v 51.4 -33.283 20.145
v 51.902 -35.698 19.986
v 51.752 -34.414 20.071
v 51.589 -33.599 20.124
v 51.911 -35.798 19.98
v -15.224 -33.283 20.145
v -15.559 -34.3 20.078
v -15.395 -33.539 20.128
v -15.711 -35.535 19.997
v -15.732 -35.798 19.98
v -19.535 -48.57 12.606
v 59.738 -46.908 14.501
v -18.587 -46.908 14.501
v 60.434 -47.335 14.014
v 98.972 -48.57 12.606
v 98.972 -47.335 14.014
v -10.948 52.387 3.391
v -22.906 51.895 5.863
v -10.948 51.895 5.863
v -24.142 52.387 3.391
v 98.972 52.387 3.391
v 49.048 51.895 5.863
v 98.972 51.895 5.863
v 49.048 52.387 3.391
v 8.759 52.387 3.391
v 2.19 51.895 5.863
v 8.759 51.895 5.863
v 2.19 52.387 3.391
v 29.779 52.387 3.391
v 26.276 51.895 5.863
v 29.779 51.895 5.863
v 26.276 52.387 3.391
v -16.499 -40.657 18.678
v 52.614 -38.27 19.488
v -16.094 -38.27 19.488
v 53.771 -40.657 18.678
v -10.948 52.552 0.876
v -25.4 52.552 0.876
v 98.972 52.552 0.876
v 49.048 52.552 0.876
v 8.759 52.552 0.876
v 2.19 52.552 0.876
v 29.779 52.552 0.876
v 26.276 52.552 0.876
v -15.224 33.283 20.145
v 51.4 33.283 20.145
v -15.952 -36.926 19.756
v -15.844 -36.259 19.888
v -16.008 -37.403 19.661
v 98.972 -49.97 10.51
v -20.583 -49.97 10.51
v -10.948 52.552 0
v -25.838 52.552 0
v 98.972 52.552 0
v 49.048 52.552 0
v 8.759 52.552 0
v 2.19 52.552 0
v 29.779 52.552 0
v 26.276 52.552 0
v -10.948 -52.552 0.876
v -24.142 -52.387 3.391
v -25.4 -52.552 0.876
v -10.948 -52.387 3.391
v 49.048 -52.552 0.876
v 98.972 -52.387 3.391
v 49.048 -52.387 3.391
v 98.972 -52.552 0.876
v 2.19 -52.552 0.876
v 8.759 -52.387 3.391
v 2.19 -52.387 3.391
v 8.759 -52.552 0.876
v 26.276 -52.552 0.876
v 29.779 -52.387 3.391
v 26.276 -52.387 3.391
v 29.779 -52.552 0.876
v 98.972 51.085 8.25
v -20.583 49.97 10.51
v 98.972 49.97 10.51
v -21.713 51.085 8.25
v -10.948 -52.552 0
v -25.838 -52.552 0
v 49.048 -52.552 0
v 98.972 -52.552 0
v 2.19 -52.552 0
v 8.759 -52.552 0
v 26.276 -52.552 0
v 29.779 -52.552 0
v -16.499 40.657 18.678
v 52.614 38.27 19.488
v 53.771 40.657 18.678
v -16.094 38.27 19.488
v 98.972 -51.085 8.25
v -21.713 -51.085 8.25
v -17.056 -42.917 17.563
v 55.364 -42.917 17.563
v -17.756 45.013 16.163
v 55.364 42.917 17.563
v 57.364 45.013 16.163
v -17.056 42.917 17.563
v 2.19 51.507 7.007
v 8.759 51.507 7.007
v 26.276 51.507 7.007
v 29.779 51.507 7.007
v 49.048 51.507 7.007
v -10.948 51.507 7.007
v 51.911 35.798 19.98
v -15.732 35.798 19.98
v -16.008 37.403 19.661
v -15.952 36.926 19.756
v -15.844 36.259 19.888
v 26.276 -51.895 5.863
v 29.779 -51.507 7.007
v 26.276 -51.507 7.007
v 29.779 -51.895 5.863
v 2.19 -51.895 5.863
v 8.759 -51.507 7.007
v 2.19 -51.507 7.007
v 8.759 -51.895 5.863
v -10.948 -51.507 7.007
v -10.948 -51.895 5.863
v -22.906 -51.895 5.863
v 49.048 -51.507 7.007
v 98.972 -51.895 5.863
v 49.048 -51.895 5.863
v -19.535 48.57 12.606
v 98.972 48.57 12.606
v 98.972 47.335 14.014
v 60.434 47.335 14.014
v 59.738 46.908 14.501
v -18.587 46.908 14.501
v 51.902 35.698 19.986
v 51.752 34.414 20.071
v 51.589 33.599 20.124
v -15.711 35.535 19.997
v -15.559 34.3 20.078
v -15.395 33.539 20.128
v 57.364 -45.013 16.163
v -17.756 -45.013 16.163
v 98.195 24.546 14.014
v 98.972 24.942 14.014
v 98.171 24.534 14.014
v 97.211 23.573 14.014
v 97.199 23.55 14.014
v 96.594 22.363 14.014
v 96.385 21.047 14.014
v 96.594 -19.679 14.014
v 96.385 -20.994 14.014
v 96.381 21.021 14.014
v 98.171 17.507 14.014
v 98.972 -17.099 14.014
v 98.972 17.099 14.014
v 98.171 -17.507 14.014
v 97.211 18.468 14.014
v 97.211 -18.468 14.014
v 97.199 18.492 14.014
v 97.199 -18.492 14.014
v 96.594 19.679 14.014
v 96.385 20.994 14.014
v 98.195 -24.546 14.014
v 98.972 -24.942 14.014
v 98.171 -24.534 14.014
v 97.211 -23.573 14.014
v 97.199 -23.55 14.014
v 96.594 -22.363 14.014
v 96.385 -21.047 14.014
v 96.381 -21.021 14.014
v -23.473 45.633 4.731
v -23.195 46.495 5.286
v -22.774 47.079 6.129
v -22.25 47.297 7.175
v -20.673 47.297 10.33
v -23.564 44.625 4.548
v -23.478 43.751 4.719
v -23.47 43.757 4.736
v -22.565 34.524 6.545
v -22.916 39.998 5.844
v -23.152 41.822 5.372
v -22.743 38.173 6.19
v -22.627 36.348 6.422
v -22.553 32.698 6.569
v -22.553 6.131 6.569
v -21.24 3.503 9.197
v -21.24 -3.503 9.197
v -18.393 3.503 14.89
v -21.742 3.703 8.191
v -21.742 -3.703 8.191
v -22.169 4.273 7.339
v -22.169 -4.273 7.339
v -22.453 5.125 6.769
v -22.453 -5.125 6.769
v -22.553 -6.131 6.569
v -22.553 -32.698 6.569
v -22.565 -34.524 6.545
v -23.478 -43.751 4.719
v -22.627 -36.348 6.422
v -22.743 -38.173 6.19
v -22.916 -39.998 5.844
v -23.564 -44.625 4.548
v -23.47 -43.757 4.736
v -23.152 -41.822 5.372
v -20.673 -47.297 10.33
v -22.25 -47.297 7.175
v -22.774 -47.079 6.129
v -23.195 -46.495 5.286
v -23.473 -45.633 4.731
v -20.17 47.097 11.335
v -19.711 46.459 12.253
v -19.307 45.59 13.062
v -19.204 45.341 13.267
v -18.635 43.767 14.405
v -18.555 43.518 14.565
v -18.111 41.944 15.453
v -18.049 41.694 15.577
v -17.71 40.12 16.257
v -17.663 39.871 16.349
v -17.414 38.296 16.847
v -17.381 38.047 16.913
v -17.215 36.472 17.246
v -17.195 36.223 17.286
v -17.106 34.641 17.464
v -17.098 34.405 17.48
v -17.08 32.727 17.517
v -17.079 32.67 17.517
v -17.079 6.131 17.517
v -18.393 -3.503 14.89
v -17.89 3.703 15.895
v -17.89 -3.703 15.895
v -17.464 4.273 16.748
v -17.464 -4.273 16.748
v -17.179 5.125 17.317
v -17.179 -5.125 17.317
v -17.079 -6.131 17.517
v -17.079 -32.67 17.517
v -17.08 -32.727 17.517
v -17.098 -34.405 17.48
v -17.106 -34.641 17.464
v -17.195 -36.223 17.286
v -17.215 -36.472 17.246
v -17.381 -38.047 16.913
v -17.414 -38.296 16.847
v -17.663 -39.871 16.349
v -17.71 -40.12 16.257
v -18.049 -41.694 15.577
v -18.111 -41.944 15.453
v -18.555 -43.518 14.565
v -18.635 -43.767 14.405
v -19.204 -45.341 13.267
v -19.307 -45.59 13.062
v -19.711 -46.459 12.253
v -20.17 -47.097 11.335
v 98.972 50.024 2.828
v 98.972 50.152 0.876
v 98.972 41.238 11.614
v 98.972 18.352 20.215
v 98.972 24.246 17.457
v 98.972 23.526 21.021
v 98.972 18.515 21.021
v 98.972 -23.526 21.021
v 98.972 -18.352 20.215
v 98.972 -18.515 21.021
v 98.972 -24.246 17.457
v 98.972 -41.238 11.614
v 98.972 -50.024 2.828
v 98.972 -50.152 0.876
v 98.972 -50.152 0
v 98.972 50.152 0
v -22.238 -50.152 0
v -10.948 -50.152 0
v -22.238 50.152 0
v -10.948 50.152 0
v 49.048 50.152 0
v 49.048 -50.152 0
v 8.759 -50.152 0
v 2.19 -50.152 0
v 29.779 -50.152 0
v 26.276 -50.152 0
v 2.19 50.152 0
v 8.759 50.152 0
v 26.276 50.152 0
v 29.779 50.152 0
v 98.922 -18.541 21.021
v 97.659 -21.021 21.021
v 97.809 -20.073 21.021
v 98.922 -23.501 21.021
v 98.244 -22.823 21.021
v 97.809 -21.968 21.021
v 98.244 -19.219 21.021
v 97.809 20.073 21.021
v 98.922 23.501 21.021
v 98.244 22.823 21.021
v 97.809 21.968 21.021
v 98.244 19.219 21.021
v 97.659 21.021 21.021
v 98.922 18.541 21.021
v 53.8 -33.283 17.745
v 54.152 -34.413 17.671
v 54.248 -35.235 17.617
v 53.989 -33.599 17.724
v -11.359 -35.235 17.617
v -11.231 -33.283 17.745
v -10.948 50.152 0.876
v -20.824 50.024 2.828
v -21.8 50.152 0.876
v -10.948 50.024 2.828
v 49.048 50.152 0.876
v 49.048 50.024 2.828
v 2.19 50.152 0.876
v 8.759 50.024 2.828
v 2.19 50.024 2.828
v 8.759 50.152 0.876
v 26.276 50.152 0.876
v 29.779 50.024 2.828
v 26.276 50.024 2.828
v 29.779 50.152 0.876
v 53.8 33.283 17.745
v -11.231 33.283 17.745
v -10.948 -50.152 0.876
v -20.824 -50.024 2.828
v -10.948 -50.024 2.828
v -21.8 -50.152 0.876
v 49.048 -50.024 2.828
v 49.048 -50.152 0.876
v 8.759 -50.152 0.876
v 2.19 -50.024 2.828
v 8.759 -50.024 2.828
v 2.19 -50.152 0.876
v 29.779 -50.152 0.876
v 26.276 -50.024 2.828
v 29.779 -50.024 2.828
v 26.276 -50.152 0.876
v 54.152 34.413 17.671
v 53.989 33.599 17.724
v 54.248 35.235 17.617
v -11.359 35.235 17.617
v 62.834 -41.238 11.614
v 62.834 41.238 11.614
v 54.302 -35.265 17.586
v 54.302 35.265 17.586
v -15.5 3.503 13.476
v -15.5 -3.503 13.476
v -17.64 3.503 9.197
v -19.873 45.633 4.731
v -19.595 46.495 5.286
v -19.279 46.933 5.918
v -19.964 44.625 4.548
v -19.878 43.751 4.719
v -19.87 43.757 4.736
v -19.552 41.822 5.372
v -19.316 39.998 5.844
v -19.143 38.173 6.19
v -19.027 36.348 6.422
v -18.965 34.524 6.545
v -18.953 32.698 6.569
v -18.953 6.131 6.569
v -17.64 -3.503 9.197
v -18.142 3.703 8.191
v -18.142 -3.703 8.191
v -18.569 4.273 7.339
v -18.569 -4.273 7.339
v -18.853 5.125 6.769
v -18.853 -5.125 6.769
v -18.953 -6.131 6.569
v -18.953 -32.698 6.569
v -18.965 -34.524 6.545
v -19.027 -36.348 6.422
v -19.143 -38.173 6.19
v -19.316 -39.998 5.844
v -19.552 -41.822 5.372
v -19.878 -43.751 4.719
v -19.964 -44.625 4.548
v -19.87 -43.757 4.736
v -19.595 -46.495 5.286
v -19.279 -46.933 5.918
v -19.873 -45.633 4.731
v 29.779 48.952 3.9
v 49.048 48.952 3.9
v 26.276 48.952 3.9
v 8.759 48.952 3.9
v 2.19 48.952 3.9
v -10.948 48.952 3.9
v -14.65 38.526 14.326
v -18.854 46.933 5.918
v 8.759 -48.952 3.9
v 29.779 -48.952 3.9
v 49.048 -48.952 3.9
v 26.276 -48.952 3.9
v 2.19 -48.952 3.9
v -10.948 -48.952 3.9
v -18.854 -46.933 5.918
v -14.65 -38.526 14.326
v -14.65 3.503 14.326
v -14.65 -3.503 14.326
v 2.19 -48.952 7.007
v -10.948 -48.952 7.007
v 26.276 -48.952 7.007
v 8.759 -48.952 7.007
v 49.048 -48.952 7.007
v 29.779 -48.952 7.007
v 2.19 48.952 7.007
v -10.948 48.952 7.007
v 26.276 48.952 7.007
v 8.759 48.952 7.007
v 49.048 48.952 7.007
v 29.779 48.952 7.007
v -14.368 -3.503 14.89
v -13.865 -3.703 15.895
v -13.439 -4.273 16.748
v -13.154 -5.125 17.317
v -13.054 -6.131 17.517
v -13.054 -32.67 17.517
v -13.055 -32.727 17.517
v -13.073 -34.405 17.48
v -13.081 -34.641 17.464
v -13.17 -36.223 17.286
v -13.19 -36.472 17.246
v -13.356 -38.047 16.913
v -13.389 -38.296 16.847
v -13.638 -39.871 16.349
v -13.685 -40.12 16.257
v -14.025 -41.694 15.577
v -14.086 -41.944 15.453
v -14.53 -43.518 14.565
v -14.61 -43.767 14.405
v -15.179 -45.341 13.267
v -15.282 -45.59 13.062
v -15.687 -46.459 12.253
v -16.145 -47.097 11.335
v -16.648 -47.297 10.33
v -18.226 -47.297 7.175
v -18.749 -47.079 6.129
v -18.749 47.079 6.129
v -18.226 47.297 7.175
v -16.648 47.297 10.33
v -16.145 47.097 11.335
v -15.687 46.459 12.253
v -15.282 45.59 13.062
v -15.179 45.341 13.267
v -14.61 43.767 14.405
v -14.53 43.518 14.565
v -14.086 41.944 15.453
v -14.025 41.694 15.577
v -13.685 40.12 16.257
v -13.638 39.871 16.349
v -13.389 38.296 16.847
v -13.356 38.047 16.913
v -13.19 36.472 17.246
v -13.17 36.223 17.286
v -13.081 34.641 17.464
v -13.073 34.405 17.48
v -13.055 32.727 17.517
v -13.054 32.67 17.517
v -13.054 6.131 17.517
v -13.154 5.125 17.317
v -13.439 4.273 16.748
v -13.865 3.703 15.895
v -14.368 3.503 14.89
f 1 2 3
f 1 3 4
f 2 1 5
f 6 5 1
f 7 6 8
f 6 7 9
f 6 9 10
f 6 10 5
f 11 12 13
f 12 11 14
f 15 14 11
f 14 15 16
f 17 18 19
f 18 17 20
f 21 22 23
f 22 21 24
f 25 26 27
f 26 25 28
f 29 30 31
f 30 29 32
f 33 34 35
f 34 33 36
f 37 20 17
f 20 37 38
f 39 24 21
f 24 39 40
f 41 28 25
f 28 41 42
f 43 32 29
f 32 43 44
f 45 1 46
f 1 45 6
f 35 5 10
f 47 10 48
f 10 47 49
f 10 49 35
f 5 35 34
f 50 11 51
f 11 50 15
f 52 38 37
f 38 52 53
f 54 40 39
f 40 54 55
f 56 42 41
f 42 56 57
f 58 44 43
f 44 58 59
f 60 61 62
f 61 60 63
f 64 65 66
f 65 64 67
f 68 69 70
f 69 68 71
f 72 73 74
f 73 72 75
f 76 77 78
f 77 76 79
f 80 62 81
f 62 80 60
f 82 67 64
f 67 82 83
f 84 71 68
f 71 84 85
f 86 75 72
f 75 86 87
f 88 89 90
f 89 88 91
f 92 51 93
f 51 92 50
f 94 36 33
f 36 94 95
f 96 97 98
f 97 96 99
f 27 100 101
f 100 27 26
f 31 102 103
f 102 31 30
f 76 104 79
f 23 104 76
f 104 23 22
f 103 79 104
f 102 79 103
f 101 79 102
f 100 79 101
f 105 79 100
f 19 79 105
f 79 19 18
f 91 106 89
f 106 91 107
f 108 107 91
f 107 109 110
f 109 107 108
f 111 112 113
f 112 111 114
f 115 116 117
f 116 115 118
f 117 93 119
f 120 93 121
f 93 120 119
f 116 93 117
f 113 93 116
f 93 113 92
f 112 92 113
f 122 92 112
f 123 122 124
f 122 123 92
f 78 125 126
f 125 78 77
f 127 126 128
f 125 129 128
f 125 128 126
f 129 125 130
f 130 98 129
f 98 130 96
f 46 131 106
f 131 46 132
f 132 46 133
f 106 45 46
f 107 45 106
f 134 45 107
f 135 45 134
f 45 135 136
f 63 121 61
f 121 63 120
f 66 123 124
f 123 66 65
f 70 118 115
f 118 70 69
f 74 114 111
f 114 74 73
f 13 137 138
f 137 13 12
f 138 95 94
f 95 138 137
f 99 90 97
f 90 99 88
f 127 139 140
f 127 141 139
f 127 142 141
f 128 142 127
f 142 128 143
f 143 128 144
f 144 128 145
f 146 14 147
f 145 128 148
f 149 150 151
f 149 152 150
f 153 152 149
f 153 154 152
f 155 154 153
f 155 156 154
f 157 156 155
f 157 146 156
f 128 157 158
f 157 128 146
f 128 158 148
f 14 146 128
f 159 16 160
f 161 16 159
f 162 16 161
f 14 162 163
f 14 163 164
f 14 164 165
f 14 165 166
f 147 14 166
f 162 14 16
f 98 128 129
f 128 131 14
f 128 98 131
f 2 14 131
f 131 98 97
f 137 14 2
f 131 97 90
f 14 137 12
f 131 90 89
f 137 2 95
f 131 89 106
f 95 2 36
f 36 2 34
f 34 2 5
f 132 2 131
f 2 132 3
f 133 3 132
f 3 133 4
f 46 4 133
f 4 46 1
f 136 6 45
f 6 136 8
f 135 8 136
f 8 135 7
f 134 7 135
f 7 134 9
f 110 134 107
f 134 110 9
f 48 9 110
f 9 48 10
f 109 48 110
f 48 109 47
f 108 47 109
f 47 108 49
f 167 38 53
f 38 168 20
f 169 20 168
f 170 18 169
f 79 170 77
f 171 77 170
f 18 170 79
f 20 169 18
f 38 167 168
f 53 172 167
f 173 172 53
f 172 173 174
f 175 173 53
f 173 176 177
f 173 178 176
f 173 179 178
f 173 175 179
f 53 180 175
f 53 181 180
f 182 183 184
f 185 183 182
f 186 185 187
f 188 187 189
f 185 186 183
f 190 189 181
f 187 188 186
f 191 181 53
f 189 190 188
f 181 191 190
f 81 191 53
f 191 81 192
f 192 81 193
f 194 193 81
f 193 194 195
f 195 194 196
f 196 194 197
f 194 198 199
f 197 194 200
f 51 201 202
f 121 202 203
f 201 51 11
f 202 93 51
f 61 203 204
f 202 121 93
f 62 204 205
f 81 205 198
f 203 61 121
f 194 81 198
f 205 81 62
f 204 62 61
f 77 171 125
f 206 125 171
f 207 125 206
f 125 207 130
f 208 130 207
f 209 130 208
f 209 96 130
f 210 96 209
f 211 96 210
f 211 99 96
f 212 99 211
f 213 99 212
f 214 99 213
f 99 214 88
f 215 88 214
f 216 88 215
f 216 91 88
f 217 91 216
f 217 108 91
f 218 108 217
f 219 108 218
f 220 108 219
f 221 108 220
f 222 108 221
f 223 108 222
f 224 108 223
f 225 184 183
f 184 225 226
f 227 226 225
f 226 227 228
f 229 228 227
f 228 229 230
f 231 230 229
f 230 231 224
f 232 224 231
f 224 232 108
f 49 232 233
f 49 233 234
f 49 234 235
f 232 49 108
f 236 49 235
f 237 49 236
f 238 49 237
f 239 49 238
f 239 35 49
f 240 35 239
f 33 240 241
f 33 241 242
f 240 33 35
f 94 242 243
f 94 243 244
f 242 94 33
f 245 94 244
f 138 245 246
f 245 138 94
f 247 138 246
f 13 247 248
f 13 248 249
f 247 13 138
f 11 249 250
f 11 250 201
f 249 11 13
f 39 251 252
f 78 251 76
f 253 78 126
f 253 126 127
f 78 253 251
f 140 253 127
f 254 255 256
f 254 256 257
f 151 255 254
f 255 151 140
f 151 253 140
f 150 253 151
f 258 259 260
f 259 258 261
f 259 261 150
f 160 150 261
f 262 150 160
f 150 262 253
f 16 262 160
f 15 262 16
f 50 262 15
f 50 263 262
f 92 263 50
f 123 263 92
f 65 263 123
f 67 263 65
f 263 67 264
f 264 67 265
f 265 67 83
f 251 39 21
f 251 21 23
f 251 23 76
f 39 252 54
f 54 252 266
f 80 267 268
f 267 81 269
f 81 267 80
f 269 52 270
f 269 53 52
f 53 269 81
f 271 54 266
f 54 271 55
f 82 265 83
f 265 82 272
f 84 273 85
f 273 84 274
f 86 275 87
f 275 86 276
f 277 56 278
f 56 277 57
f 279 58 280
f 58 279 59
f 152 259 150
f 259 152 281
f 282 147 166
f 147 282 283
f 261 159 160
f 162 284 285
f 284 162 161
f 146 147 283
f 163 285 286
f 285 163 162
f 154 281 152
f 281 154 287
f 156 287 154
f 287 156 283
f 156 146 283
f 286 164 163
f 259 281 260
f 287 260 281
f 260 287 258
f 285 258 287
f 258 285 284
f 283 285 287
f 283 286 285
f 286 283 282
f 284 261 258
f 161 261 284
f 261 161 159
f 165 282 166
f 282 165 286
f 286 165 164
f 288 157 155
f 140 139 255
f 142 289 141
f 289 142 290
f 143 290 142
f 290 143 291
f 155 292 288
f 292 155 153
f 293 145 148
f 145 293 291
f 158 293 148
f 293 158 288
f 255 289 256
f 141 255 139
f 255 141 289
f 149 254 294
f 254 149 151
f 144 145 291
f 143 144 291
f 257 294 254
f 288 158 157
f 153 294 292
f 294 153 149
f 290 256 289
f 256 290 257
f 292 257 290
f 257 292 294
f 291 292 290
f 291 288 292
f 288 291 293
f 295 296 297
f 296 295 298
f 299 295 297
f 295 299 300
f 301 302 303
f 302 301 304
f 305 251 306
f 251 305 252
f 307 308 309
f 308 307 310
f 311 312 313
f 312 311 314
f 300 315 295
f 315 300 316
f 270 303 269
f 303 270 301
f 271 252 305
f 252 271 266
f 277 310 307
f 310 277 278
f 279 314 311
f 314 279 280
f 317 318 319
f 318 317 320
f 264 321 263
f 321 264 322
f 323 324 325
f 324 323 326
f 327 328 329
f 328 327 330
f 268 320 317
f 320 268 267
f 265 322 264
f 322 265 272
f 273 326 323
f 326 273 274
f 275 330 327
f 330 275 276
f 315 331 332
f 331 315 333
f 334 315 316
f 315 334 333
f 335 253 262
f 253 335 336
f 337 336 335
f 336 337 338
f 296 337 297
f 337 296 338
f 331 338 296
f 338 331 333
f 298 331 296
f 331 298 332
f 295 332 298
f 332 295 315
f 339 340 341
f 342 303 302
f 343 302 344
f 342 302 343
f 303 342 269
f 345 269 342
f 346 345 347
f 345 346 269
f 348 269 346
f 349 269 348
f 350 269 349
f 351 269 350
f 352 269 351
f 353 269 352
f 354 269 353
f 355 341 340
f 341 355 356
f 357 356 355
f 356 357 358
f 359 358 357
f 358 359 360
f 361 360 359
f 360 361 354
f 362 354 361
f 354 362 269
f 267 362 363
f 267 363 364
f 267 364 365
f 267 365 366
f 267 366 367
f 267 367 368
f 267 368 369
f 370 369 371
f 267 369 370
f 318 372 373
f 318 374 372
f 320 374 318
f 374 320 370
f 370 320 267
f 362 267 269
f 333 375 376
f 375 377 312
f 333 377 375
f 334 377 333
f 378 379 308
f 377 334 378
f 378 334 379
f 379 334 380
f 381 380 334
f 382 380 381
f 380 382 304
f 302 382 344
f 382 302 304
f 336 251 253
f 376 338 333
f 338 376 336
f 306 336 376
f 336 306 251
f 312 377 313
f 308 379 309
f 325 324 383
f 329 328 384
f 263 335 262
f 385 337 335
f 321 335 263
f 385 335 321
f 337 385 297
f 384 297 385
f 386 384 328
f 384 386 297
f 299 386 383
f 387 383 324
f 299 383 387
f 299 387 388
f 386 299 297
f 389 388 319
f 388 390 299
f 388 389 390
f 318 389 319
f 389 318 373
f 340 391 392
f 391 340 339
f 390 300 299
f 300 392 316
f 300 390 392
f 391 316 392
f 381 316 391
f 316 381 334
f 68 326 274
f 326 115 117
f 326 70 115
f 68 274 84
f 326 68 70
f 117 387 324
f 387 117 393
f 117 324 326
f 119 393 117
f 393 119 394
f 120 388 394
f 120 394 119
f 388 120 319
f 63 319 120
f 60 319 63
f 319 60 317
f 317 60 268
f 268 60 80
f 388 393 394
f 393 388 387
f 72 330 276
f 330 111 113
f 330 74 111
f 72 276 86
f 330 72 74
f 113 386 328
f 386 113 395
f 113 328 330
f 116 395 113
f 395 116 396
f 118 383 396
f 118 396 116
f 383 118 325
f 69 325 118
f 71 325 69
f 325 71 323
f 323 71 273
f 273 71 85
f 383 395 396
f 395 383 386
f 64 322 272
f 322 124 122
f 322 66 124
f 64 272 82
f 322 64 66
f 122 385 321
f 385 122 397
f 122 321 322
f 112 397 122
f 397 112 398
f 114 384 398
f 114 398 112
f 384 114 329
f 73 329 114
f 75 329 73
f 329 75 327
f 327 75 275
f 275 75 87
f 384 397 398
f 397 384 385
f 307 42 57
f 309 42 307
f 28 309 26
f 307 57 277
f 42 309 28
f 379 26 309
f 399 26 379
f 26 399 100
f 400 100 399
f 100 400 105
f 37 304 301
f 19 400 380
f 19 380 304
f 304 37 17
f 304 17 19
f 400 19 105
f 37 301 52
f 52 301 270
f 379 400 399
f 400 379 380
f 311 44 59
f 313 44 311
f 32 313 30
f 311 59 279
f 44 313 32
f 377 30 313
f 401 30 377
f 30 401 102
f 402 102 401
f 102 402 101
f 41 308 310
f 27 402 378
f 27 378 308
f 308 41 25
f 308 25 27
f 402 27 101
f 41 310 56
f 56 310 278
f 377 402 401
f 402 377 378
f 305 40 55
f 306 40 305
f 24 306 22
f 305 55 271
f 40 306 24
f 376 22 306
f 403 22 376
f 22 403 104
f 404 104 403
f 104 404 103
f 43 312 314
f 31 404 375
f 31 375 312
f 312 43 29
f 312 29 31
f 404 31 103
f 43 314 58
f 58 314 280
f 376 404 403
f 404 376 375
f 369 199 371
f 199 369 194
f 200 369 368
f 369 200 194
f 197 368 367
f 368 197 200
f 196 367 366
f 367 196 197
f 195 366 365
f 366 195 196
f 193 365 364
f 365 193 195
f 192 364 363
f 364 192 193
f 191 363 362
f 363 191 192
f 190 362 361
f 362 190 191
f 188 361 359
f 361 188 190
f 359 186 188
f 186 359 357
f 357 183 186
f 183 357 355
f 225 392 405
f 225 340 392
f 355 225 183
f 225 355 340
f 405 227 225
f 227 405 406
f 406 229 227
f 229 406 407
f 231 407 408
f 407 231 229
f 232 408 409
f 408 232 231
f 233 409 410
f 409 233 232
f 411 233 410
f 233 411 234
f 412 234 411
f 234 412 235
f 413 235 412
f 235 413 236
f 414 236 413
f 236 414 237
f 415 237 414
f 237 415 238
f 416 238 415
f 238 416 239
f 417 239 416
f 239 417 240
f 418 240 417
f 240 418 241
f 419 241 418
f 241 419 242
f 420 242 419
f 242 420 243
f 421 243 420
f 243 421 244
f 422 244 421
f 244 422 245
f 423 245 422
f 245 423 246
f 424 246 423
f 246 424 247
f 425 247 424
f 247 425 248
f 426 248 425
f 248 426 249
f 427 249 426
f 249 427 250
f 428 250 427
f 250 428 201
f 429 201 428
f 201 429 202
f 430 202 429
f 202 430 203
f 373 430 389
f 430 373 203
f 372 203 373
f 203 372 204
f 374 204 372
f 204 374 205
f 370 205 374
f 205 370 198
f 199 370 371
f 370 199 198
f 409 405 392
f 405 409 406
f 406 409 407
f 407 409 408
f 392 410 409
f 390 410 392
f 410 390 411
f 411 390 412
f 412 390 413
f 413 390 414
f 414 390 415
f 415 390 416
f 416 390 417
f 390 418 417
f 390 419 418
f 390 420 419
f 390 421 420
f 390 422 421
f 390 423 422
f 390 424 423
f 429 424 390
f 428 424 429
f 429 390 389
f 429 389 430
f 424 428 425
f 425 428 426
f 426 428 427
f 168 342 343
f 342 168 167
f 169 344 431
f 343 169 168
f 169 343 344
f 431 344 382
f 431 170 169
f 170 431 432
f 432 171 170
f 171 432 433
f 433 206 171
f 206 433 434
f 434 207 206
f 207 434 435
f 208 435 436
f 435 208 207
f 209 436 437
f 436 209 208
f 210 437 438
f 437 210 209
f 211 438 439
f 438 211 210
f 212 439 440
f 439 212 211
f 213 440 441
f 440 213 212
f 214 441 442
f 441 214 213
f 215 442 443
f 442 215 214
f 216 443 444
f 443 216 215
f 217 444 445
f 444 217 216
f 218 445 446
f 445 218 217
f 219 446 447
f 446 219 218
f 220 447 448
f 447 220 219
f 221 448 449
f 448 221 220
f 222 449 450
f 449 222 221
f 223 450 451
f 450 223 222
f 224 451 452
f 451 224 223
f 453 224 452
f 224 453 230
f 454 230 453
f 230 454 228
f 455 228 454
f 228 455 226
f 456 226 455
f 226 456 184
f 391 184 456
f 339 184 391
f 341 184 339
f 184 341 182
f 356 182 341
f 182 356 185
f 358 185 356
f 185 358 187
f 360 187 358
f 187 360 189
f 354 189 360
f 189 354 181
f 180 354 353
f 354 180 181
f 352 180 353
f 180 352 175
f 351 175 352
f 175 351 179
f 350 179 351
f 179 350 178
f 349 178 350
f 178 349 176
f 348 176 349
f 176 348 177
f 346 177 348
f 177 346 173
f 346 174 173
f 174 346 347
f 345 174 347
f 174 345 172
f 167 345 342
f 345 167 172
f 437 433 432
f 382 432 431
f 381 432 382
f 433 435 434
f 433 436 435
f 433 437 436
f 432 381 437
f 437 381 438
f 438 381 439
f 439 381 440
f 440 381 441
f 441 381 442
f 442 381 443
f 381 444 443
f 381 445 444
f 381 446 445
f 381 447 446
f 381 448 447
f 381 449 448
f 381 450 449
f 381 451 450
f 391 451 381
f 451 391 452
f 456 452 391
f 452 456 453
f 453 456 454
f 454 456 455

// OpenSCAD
// Milwaukee Road Little Joe, G scale 1-29 - print 5 of 20: roof_1 - roof, section 1 (print upright)
// Render (F6), export STL, print. Settings: ../../library/lj_params.scad
// Whole loco preview and notes: ../../MILW_LittleJoe_Main.scad
SCALE_SEL = "G";
LOCO_SEL = "E70";   // [E20, E21, E70, E71, E72, E73, E74, E75, E76, E77, E78, E79] the body and roof change for E20 / E21
include <../../library/lj_all.scad>
lj_plate("roof_1");
